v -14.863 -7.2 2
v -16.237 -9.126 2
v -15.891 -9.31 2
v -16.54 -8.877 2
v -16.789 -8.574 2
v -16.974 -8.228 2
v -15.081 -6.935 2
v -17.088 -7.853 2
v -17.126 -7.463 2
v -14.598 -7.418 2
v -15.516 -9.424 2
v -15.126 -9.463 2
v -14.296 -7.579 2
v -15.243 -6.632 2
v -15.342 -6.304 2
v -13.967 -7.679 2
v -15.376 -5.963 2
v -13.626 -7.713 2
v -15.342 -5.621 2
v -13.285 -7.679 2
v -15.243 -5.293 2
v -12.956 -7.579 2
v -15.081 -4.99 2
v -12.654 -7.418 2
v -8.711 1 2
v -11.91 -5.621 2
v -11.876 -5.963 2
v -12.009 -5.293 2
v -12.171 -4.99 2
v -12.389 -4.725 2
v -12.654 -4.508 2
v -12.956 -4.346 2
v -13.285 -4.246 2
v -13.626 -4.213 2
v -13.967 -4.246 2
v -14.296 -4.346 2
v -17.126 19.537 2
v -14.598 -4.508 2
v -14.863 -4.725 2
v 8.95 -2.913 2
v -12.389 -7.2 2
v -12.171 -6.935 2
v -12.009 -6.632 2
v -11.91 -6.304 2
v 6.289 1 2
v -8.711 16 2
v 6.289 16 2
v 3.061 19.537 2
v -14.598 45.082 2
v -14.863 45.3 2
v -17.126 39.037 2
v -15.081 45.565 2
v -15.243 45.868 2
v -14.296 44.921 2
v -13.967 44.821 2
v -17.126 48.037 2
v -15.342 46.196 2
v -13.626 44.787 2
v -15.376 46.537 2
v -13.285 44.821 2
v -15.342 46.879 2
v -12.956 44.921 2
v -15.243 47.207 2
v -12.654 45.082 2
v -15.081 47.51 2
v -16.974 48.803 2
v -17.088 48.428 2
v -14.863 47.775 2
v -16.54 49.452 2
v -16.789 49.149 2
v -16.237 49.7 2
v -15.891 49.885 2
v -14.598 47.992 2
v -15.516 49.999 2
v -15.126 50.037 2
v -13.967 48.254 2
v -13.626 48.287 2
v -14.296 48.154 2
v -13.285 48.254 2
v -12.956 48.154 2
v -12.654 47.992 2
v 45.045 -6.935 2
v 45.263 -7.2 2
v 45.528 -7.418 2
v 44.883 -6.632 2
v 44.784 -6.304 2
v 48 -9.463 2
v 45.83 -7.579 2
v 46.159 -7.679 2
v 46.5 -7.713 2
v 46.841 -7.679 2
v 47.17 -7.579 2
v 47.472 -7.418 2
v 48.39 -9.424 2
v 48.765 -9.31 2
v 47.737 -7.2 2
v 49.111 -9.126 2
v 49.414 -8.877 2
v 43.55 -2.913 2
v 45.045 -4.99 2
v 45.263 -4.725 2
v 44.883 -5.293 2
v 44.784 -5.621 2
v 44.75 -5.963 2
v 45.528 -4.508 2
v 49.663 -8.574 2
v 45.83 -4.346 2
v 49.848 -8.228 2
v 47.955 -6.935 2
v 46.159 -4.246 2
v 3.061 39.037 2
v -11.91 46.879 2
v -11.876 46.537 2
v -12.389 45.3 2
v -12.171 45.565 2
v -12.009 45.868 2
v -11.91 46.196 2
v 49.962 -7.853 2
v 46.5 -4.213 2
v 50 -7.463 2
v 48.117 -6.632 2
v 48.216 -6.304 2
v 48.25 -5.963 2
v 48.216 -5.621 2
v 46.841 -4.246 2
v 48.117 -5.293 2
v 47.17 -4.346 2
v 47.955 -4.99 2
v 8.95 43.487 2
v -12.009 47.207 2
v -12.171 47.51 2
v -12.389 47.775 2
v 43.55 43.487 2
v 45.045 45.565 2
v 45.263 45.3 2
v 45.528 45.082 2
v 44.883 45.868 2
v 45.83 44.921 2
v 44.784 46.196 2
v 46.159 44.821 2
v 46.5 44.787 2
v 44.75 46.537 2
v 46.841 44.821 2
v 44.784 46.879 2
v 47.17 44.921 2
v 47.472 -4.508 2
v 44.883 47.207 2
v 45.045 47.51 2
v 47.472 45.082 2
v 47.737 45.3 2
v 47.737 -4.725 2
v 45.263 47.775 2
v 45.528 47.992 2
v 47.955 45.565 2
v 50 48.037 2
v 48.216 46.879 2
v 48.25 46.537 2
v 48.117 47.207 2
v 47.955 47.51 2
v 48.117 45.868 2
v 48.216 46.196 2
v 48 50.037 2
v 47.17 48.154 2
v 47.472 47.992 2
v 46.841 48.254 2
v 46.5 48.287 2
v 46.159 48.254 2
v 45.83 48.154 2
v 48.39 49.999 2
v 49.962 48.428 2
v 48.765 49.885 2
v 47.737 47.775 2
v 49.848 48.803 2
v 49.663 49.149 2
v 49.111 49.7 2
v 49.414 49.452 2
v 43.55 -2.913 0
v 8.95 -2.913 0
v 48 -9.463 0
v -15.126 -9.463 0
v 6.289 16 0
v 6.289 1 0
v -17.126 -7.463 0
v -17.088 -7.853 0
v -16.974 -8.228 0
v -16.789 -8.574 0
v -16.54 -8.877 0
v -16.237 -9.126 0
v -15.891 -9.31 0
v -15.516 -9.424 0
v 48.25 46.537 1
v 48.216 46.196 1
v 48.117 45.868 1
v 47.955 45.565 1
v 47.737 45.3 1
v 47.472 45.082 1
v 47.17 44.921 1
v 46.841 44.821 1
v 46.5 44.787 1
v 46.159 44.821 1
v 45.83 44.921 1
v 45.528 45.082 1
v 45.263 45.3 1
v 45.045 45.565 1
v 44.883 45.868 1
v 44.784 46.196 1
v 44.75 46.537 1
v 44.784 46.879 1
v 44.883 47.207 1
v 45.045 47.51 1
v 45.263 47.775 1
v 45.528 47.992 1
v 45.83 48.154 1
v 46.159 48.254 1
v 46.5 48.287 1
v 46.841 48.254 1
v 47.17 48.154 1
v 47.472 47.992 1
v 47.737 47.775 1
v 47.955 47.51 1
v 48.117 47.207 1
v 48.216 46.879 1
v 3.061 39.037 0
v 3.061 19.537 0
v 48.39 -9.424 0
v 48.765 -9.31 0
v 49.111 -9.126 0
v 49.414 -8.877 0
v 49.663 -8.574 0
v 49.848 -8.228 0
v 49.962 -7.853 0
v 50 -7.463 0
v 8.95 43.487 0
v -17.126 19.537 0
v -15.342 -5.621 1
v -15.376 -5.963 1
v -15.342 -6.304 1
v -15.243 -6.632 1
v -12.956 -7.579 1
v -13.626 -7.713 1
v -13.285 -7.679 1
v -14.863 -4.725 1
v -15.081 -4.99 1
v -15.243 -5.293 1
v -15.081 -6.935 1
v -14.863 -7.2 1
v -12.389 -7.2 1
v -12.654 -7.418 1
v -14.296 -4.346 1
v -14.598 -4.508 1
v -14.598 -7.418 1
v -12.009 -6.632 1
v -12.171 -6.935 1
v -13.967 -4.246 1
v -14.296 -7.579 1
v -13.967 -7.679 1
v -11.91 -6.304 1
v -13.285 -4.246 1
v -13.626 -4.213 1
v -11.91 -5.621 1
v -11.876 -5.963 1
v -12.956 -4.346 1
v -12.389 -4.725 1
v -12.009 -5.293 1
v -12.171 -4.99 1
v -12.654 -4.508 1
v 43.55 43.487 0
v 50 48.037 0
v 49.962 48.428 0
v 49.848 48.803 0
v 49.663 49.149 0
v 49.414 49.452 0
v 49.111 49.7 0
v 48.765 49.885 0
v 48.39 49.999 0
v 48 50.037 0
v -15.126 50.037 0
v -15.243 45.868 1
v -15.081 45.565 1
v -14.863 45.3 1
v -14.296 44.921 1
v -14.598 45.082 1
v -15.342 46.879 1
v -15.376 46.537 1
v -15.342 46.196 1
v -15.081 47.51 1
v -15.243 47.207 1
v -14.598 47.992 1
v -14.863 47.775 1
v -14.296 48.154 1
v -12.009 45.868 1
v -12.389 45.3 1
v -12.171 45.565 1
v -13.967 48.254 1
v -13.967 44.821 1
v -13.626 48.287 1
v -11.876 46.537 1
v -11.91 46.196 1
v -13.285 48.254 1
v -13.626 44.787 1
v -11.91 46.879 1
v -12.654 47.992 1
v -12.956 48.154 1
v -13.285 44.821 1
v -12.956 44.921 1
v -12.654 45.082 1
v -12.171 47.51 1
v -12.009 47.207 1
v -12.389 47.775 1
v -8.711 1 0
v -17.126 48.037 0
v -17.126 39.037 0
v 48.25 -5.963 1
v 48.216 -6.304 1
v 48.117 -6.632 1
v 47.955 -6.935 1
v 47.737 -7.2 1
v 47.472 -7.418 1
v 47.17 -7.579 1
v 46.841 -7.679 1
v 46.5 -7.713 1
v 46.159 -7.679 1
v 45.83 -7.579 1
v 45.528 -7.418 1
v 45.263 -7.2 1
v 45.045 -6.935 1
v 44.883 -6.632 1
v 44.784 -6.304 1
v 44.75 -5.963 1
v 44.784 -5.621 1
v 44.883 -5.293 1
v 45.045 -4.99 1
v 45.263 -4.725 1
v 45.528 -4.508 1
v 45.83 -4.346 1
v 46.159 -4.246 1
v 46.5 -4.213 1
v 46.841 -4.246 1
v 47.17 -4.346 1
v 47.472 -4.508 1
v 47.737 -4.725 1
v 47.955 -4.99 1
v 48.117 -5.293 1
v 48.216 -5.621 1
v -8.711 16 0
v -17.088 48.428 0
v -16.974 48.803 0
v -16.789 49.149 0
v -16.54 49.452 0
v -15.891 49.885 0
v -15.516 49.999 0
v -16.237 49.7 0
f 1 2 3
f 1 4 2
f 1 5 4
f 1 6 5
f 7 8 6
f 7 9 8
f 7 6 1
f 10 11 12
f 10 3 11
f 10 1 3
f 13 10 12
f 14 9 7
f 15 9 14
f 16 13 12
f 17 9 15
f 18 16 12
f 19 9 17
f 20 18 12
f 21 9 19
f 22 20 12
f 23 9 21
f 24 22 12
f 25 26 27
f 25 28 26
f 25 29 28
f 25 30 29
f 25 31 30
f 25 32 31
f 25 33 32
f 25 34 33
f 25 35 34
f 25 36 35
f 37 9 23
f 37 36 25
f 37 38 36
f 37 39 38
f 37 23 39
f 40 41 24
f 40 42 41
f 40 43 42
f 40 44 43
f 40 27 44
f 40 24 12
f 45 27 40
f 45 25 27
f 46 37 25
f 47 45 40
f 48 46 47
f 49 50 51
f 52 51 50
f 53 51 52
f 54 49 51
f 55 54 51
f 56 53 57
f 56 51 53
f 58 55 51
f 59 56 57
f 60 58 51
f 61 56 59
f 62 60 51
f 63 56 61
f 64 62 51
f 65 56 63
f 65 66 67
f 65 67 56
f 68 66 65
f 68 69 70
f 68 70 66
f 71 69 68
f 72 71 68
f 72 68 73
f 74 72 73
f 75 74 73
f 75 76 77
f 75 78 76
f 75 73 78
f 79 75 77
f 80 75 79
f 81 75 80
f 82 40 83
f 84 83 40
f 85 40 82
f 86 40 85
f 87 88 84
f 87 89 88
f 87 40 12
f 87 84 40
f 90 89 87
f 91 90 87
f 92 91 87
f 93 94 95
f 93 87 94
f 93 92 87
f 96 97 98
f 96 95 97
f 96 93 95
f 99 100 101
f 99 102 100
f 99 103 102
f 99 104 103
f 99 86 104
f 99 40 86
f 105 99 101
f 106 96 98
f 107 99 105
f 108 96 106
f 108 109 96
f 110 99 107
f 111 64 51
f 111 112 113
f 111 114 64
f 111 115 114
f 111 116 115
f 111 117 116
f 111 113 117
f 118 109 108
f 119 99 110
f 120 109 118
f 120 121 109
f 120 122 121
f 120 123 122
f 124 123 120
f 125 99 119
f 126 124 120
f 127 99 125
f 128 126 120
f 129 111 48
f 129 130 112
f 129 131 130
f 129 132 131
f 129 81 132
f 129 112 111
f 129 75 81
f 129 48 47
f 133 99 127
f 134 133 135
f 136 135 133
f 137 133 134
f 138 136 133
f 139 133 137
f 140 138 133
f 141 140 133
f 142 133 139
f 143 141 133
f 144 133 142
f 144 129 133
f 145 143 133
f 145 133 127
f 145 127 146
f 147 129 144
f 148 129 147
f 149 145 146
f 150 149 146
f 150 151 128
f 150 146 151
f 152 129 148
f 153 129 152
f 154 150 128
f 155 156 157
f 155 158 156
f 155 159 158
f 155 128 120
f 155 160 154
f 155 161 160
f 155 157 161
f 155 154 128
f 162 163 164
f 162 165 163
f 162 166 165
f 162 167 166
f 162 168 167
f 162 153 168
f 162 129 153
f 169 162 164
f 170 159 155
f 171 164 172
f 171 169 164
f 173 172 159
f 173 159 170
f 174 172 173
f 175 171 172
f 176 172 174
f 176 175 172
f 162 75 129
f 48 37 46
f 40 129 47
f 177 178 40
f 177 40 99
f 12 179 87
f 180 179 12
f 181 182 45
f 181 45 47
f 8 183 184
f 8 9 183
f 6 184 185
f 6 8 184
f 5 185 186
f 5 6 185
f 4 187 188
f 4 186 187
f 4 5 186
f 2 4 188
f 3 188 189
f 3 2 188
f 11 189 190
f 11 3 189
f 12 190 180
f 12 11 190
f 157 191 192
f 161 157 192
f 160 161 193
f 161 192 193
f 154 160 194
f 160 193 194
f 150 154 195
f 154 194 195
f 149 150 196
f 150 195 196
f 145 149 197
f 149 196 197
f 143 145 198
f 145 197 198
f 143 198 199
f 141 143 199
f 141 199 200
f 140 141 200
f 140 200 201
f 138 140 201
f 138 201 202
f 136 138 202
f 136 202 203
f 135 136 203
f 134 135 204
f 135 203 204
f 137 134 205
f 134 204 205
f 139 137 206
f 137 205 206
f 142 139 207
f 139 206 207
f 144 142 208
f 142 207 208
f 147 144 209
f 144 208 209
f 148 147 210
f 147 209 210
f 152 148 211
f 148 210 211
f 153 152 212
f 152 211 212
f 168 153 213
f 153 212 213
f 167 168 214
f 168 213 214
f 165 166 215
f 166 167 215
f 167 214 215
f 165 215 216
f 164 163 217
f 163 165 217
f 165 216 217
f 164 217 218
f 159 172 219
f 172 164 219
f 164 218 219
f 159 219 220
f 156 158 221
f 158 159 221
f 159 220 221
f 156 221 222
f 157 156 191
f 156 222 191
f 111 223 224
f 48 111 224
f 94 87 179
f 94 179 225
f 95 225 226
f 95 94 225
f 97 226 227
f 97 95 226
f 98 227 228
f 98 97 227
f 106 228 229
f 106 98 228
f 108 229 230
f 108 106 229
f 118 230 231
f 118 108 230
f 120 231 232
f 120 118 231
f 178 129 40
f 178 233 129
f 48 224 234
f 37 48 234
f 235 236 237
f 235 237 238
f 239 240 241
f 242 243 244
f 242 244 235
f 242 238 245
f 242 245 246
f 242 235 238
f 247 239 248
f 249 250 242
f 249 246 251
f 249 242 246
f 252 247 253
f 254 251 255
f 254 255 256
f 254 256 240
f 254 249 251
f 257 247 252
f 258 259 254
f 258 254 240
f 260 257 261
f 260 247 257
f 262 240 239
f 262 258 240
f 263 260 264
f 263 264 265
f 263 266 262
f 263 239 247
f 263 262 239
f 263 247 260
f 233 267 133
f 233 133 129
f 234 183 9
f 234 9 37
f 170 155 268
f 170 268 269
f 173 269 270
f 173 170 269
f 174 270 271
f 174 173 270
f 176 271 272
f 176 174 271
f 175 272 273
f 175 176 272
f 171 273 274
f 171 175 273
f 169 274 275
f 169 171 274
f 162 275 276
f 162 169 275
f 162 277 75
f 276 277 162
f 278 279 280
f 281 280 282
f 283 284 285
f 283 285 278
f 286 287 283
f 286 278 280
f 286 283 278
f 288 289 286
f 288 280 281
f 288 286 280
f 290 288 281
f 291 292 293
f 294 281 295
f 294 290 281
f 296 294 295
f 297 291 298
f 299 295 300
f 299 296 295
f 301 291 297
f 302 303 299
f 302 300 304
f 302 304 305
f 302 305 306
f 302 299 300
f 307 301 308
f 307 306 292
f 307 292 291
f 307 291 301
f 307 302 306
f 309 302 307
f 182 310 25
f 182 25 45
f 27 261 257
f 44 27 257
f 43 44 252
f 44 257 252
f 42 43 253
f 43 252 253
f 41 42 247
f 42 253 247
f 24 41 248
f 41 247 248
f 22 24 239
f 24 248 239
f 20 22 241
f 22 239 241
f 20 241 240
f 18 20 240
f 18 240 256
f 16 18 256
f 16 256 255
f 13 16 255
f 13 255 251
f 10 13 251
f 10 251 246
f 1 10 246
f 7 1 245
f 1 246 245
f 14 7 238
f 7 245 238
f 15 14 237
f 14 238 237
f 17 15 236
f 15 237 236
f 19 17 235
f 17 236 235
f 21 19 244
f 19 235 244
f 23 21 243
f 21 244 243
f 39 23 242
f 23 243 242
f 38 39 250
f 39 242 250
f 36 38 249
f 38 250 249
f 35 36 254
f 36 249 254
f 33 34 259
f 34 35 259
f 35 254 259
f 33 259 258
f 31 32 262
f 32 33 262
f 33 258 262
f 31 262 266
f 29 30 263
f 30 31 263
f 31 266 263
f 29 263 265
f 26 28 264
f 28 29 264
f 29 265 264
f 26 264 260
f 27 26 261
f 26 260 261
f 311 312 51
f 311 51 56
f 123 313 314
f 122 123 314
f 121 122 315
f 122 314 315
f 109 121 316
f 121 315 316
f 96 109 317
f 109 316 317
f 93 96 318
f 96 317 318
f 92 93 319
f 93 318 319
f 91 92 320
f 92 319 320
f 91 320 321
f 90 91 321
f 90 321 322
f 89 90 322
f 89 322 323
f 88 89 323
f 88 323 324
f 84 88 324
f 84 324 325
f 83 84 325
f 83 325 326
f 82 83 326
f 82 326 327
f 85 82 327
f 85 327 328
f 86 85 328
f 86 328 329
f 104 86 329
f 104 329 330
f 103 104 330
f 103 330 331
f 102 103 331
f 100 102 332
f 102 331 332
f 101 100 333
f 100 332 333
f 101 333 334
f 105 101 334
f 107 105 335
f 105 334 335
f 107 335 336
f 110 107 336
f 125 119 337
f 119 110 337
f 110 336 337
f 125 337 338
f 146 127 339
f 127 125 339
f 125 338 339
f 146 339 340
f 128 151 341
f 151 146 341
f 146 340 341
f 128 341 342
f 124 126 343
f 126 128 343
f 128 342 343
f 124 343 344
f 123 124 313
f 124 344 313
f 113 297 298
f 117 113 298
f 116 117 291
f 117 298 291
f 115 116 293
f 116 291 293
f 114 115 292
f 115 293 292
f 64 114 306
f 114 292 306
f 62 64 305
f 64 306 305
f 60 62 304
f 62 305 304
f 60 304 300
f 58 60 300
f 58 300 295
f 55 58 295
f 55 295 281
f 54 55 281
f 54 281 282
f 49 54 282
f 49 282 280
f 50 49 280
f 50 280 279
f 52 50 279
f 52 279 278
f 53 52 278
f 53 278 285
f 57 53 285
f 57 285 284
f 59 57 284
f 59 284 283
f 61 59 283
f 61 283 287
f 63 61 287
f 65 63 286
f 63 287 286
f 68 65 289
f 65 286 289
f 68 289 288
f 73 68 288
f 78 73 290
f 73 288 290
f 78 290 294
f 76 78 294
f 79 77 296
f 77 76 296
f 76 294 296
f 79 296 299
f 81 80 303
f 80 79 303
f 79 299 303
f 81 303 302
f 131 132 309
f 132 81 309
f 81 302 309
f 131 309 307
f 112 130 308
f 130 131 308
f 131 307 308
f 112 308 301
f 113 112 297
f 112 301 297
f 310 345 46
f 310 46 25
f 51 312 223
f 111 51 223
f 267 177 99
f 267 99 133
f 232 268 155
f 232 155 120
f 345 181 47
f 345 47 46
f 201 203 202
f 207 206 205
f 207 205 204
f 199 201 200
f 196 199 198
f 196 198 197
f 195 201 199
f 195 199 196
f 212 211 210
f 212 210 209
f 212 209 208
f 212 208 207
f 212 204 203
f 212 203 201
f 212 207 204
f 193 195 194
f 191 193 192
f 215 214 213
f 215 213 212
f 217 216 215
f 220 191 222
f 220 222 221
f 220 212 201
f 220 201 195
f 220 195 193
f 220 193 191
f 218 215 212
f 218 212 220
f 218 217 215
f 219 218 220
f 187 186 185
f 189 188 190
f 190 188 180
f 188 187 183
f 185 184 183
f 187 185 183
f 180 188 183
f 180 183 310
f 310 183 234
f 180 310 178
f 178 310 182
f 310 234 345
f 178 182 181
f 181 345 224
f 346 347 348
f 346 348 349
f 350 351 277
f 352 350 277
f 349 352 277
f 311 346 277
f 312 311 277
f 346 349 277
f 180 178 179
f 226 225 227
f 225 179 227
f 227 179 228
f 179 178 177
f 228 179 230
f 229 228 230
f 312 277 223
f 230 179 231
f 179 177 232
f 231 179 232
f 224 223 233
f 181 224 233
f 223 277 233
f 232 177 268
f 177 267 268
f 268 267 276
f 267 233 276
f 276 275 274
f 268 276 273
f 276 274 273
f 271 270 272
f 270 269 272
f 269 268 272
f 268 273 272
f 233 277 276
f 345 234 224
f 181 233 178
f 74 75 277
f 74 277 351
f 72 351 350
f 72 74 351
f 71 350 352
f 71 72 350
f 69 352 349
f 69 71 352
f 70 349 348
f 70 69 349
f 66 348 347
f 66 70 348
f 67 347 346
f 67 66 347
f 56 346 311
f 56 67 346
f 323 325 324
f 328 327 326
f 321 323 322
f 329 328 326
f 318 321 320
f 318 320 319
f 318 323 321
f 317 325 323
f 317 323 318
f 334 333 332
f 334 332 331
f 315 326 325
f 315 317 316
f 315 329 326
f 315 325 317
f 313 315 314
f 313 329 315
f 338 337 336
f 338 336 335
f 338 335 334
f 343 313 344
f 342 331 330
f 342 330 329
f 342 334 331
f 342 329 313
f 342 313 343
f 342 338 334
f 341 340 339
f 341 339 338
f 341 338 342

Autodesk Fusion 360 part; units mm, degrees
sketch "Sketch1" plane through (0, 0, 0) normal (0, 0, 1) x (1, 0, 0)
  line L0 (-17.126, 50.0374) -> (50, 50.0374)
  line L1 (50, 50.0374) -> (50, -9.4626)
  line L2 (50, -9.4626) -> (-17.126, -9.4626)
  line L3 (-17.126, -9.4626) -> (-17.126, 50.0374)
  circle A0 centre (-13.626, 46.5374) radius 1.75
  circle A1 centre (46.5, 46.5374) radius 1.75
  circle A2 centre (46.5, -5.9626) radius 1.75
  circle A3 centre (-13.626, -5.9626) radius 1.75
  line L4 (-17.1389, 39.0374) -> (3.0611, 39.0374)
  line L5 (3.0611, 39.0374) -> (3.0611, 19.5374)
  line L6 (3.0611, 19.5374) -> (-17.1389, 19.5374)
  line L7 (-17.1389, 19.5374) -> (-17.1389, 39.0374)
  line L8 (6.289, 16) -> (-8.711, 16)
  line L9 (-8.711, 16) -> (-8.711, 1)
  line L10 (-8.711, 1) -> (6.289, 1)
  line L11 (6.289, 1) -> (6.289, 16)
  line L12 (43.55, 43.4874) -> (8.95, 43.4874)
  line L13 (8.95, 43.4874) -> (8.95, -2.9126)
  line L14 (8.95, -2.9126) -> (43.55, -2.9126)
  line L15 (43.55, -2.9126) -> (43.55, 43.4874)
  dimension "d1" = 59.5
  dimension "d2" = 67.126
  dimension "d5" = 3.5
  dimension "d6" = 3.5
  dimension "d7" = 3.5
  dimension "d8" = 3.5
  dimension "d9" = 3.5
  dimension "d10" = 3.5
  dimension "d11" = 3.5
  dimension "d12" = 3.5
  dimension "d13" = 3.5
  dimension "d14" = 3.5
  dimension "d15" = 3.5
  dimension "d16" = 3.5
  dimension "d23" = 20.2
  dimension "d24" = 19.5
  dimension "d25" = 11
  dimension "d26" = 15
  dimension "d27" = 15
  dimension "d28" = 8.415
  dimension "d29" = 34.6
  dimension "d30" = 46.4
  dimension "d31" = 6.55
  dimension "d32" = 6.45
extrude "Extrude2" add sketch "Sketch1" along normal blind 2 contours L0 L1 L2 L3 L4 L5 L6
fillet "Fillet1" radius 2 4 edges at (50, -9.4626, 1) (-17.126, -9.4626, 1) (50, 50.0374, 1) (-17.126, 50.0374, 1)
extrude "Extrude3" add sketch "Sketch1" along normal blind 1 contours A0 | A1 | A2 | A3
